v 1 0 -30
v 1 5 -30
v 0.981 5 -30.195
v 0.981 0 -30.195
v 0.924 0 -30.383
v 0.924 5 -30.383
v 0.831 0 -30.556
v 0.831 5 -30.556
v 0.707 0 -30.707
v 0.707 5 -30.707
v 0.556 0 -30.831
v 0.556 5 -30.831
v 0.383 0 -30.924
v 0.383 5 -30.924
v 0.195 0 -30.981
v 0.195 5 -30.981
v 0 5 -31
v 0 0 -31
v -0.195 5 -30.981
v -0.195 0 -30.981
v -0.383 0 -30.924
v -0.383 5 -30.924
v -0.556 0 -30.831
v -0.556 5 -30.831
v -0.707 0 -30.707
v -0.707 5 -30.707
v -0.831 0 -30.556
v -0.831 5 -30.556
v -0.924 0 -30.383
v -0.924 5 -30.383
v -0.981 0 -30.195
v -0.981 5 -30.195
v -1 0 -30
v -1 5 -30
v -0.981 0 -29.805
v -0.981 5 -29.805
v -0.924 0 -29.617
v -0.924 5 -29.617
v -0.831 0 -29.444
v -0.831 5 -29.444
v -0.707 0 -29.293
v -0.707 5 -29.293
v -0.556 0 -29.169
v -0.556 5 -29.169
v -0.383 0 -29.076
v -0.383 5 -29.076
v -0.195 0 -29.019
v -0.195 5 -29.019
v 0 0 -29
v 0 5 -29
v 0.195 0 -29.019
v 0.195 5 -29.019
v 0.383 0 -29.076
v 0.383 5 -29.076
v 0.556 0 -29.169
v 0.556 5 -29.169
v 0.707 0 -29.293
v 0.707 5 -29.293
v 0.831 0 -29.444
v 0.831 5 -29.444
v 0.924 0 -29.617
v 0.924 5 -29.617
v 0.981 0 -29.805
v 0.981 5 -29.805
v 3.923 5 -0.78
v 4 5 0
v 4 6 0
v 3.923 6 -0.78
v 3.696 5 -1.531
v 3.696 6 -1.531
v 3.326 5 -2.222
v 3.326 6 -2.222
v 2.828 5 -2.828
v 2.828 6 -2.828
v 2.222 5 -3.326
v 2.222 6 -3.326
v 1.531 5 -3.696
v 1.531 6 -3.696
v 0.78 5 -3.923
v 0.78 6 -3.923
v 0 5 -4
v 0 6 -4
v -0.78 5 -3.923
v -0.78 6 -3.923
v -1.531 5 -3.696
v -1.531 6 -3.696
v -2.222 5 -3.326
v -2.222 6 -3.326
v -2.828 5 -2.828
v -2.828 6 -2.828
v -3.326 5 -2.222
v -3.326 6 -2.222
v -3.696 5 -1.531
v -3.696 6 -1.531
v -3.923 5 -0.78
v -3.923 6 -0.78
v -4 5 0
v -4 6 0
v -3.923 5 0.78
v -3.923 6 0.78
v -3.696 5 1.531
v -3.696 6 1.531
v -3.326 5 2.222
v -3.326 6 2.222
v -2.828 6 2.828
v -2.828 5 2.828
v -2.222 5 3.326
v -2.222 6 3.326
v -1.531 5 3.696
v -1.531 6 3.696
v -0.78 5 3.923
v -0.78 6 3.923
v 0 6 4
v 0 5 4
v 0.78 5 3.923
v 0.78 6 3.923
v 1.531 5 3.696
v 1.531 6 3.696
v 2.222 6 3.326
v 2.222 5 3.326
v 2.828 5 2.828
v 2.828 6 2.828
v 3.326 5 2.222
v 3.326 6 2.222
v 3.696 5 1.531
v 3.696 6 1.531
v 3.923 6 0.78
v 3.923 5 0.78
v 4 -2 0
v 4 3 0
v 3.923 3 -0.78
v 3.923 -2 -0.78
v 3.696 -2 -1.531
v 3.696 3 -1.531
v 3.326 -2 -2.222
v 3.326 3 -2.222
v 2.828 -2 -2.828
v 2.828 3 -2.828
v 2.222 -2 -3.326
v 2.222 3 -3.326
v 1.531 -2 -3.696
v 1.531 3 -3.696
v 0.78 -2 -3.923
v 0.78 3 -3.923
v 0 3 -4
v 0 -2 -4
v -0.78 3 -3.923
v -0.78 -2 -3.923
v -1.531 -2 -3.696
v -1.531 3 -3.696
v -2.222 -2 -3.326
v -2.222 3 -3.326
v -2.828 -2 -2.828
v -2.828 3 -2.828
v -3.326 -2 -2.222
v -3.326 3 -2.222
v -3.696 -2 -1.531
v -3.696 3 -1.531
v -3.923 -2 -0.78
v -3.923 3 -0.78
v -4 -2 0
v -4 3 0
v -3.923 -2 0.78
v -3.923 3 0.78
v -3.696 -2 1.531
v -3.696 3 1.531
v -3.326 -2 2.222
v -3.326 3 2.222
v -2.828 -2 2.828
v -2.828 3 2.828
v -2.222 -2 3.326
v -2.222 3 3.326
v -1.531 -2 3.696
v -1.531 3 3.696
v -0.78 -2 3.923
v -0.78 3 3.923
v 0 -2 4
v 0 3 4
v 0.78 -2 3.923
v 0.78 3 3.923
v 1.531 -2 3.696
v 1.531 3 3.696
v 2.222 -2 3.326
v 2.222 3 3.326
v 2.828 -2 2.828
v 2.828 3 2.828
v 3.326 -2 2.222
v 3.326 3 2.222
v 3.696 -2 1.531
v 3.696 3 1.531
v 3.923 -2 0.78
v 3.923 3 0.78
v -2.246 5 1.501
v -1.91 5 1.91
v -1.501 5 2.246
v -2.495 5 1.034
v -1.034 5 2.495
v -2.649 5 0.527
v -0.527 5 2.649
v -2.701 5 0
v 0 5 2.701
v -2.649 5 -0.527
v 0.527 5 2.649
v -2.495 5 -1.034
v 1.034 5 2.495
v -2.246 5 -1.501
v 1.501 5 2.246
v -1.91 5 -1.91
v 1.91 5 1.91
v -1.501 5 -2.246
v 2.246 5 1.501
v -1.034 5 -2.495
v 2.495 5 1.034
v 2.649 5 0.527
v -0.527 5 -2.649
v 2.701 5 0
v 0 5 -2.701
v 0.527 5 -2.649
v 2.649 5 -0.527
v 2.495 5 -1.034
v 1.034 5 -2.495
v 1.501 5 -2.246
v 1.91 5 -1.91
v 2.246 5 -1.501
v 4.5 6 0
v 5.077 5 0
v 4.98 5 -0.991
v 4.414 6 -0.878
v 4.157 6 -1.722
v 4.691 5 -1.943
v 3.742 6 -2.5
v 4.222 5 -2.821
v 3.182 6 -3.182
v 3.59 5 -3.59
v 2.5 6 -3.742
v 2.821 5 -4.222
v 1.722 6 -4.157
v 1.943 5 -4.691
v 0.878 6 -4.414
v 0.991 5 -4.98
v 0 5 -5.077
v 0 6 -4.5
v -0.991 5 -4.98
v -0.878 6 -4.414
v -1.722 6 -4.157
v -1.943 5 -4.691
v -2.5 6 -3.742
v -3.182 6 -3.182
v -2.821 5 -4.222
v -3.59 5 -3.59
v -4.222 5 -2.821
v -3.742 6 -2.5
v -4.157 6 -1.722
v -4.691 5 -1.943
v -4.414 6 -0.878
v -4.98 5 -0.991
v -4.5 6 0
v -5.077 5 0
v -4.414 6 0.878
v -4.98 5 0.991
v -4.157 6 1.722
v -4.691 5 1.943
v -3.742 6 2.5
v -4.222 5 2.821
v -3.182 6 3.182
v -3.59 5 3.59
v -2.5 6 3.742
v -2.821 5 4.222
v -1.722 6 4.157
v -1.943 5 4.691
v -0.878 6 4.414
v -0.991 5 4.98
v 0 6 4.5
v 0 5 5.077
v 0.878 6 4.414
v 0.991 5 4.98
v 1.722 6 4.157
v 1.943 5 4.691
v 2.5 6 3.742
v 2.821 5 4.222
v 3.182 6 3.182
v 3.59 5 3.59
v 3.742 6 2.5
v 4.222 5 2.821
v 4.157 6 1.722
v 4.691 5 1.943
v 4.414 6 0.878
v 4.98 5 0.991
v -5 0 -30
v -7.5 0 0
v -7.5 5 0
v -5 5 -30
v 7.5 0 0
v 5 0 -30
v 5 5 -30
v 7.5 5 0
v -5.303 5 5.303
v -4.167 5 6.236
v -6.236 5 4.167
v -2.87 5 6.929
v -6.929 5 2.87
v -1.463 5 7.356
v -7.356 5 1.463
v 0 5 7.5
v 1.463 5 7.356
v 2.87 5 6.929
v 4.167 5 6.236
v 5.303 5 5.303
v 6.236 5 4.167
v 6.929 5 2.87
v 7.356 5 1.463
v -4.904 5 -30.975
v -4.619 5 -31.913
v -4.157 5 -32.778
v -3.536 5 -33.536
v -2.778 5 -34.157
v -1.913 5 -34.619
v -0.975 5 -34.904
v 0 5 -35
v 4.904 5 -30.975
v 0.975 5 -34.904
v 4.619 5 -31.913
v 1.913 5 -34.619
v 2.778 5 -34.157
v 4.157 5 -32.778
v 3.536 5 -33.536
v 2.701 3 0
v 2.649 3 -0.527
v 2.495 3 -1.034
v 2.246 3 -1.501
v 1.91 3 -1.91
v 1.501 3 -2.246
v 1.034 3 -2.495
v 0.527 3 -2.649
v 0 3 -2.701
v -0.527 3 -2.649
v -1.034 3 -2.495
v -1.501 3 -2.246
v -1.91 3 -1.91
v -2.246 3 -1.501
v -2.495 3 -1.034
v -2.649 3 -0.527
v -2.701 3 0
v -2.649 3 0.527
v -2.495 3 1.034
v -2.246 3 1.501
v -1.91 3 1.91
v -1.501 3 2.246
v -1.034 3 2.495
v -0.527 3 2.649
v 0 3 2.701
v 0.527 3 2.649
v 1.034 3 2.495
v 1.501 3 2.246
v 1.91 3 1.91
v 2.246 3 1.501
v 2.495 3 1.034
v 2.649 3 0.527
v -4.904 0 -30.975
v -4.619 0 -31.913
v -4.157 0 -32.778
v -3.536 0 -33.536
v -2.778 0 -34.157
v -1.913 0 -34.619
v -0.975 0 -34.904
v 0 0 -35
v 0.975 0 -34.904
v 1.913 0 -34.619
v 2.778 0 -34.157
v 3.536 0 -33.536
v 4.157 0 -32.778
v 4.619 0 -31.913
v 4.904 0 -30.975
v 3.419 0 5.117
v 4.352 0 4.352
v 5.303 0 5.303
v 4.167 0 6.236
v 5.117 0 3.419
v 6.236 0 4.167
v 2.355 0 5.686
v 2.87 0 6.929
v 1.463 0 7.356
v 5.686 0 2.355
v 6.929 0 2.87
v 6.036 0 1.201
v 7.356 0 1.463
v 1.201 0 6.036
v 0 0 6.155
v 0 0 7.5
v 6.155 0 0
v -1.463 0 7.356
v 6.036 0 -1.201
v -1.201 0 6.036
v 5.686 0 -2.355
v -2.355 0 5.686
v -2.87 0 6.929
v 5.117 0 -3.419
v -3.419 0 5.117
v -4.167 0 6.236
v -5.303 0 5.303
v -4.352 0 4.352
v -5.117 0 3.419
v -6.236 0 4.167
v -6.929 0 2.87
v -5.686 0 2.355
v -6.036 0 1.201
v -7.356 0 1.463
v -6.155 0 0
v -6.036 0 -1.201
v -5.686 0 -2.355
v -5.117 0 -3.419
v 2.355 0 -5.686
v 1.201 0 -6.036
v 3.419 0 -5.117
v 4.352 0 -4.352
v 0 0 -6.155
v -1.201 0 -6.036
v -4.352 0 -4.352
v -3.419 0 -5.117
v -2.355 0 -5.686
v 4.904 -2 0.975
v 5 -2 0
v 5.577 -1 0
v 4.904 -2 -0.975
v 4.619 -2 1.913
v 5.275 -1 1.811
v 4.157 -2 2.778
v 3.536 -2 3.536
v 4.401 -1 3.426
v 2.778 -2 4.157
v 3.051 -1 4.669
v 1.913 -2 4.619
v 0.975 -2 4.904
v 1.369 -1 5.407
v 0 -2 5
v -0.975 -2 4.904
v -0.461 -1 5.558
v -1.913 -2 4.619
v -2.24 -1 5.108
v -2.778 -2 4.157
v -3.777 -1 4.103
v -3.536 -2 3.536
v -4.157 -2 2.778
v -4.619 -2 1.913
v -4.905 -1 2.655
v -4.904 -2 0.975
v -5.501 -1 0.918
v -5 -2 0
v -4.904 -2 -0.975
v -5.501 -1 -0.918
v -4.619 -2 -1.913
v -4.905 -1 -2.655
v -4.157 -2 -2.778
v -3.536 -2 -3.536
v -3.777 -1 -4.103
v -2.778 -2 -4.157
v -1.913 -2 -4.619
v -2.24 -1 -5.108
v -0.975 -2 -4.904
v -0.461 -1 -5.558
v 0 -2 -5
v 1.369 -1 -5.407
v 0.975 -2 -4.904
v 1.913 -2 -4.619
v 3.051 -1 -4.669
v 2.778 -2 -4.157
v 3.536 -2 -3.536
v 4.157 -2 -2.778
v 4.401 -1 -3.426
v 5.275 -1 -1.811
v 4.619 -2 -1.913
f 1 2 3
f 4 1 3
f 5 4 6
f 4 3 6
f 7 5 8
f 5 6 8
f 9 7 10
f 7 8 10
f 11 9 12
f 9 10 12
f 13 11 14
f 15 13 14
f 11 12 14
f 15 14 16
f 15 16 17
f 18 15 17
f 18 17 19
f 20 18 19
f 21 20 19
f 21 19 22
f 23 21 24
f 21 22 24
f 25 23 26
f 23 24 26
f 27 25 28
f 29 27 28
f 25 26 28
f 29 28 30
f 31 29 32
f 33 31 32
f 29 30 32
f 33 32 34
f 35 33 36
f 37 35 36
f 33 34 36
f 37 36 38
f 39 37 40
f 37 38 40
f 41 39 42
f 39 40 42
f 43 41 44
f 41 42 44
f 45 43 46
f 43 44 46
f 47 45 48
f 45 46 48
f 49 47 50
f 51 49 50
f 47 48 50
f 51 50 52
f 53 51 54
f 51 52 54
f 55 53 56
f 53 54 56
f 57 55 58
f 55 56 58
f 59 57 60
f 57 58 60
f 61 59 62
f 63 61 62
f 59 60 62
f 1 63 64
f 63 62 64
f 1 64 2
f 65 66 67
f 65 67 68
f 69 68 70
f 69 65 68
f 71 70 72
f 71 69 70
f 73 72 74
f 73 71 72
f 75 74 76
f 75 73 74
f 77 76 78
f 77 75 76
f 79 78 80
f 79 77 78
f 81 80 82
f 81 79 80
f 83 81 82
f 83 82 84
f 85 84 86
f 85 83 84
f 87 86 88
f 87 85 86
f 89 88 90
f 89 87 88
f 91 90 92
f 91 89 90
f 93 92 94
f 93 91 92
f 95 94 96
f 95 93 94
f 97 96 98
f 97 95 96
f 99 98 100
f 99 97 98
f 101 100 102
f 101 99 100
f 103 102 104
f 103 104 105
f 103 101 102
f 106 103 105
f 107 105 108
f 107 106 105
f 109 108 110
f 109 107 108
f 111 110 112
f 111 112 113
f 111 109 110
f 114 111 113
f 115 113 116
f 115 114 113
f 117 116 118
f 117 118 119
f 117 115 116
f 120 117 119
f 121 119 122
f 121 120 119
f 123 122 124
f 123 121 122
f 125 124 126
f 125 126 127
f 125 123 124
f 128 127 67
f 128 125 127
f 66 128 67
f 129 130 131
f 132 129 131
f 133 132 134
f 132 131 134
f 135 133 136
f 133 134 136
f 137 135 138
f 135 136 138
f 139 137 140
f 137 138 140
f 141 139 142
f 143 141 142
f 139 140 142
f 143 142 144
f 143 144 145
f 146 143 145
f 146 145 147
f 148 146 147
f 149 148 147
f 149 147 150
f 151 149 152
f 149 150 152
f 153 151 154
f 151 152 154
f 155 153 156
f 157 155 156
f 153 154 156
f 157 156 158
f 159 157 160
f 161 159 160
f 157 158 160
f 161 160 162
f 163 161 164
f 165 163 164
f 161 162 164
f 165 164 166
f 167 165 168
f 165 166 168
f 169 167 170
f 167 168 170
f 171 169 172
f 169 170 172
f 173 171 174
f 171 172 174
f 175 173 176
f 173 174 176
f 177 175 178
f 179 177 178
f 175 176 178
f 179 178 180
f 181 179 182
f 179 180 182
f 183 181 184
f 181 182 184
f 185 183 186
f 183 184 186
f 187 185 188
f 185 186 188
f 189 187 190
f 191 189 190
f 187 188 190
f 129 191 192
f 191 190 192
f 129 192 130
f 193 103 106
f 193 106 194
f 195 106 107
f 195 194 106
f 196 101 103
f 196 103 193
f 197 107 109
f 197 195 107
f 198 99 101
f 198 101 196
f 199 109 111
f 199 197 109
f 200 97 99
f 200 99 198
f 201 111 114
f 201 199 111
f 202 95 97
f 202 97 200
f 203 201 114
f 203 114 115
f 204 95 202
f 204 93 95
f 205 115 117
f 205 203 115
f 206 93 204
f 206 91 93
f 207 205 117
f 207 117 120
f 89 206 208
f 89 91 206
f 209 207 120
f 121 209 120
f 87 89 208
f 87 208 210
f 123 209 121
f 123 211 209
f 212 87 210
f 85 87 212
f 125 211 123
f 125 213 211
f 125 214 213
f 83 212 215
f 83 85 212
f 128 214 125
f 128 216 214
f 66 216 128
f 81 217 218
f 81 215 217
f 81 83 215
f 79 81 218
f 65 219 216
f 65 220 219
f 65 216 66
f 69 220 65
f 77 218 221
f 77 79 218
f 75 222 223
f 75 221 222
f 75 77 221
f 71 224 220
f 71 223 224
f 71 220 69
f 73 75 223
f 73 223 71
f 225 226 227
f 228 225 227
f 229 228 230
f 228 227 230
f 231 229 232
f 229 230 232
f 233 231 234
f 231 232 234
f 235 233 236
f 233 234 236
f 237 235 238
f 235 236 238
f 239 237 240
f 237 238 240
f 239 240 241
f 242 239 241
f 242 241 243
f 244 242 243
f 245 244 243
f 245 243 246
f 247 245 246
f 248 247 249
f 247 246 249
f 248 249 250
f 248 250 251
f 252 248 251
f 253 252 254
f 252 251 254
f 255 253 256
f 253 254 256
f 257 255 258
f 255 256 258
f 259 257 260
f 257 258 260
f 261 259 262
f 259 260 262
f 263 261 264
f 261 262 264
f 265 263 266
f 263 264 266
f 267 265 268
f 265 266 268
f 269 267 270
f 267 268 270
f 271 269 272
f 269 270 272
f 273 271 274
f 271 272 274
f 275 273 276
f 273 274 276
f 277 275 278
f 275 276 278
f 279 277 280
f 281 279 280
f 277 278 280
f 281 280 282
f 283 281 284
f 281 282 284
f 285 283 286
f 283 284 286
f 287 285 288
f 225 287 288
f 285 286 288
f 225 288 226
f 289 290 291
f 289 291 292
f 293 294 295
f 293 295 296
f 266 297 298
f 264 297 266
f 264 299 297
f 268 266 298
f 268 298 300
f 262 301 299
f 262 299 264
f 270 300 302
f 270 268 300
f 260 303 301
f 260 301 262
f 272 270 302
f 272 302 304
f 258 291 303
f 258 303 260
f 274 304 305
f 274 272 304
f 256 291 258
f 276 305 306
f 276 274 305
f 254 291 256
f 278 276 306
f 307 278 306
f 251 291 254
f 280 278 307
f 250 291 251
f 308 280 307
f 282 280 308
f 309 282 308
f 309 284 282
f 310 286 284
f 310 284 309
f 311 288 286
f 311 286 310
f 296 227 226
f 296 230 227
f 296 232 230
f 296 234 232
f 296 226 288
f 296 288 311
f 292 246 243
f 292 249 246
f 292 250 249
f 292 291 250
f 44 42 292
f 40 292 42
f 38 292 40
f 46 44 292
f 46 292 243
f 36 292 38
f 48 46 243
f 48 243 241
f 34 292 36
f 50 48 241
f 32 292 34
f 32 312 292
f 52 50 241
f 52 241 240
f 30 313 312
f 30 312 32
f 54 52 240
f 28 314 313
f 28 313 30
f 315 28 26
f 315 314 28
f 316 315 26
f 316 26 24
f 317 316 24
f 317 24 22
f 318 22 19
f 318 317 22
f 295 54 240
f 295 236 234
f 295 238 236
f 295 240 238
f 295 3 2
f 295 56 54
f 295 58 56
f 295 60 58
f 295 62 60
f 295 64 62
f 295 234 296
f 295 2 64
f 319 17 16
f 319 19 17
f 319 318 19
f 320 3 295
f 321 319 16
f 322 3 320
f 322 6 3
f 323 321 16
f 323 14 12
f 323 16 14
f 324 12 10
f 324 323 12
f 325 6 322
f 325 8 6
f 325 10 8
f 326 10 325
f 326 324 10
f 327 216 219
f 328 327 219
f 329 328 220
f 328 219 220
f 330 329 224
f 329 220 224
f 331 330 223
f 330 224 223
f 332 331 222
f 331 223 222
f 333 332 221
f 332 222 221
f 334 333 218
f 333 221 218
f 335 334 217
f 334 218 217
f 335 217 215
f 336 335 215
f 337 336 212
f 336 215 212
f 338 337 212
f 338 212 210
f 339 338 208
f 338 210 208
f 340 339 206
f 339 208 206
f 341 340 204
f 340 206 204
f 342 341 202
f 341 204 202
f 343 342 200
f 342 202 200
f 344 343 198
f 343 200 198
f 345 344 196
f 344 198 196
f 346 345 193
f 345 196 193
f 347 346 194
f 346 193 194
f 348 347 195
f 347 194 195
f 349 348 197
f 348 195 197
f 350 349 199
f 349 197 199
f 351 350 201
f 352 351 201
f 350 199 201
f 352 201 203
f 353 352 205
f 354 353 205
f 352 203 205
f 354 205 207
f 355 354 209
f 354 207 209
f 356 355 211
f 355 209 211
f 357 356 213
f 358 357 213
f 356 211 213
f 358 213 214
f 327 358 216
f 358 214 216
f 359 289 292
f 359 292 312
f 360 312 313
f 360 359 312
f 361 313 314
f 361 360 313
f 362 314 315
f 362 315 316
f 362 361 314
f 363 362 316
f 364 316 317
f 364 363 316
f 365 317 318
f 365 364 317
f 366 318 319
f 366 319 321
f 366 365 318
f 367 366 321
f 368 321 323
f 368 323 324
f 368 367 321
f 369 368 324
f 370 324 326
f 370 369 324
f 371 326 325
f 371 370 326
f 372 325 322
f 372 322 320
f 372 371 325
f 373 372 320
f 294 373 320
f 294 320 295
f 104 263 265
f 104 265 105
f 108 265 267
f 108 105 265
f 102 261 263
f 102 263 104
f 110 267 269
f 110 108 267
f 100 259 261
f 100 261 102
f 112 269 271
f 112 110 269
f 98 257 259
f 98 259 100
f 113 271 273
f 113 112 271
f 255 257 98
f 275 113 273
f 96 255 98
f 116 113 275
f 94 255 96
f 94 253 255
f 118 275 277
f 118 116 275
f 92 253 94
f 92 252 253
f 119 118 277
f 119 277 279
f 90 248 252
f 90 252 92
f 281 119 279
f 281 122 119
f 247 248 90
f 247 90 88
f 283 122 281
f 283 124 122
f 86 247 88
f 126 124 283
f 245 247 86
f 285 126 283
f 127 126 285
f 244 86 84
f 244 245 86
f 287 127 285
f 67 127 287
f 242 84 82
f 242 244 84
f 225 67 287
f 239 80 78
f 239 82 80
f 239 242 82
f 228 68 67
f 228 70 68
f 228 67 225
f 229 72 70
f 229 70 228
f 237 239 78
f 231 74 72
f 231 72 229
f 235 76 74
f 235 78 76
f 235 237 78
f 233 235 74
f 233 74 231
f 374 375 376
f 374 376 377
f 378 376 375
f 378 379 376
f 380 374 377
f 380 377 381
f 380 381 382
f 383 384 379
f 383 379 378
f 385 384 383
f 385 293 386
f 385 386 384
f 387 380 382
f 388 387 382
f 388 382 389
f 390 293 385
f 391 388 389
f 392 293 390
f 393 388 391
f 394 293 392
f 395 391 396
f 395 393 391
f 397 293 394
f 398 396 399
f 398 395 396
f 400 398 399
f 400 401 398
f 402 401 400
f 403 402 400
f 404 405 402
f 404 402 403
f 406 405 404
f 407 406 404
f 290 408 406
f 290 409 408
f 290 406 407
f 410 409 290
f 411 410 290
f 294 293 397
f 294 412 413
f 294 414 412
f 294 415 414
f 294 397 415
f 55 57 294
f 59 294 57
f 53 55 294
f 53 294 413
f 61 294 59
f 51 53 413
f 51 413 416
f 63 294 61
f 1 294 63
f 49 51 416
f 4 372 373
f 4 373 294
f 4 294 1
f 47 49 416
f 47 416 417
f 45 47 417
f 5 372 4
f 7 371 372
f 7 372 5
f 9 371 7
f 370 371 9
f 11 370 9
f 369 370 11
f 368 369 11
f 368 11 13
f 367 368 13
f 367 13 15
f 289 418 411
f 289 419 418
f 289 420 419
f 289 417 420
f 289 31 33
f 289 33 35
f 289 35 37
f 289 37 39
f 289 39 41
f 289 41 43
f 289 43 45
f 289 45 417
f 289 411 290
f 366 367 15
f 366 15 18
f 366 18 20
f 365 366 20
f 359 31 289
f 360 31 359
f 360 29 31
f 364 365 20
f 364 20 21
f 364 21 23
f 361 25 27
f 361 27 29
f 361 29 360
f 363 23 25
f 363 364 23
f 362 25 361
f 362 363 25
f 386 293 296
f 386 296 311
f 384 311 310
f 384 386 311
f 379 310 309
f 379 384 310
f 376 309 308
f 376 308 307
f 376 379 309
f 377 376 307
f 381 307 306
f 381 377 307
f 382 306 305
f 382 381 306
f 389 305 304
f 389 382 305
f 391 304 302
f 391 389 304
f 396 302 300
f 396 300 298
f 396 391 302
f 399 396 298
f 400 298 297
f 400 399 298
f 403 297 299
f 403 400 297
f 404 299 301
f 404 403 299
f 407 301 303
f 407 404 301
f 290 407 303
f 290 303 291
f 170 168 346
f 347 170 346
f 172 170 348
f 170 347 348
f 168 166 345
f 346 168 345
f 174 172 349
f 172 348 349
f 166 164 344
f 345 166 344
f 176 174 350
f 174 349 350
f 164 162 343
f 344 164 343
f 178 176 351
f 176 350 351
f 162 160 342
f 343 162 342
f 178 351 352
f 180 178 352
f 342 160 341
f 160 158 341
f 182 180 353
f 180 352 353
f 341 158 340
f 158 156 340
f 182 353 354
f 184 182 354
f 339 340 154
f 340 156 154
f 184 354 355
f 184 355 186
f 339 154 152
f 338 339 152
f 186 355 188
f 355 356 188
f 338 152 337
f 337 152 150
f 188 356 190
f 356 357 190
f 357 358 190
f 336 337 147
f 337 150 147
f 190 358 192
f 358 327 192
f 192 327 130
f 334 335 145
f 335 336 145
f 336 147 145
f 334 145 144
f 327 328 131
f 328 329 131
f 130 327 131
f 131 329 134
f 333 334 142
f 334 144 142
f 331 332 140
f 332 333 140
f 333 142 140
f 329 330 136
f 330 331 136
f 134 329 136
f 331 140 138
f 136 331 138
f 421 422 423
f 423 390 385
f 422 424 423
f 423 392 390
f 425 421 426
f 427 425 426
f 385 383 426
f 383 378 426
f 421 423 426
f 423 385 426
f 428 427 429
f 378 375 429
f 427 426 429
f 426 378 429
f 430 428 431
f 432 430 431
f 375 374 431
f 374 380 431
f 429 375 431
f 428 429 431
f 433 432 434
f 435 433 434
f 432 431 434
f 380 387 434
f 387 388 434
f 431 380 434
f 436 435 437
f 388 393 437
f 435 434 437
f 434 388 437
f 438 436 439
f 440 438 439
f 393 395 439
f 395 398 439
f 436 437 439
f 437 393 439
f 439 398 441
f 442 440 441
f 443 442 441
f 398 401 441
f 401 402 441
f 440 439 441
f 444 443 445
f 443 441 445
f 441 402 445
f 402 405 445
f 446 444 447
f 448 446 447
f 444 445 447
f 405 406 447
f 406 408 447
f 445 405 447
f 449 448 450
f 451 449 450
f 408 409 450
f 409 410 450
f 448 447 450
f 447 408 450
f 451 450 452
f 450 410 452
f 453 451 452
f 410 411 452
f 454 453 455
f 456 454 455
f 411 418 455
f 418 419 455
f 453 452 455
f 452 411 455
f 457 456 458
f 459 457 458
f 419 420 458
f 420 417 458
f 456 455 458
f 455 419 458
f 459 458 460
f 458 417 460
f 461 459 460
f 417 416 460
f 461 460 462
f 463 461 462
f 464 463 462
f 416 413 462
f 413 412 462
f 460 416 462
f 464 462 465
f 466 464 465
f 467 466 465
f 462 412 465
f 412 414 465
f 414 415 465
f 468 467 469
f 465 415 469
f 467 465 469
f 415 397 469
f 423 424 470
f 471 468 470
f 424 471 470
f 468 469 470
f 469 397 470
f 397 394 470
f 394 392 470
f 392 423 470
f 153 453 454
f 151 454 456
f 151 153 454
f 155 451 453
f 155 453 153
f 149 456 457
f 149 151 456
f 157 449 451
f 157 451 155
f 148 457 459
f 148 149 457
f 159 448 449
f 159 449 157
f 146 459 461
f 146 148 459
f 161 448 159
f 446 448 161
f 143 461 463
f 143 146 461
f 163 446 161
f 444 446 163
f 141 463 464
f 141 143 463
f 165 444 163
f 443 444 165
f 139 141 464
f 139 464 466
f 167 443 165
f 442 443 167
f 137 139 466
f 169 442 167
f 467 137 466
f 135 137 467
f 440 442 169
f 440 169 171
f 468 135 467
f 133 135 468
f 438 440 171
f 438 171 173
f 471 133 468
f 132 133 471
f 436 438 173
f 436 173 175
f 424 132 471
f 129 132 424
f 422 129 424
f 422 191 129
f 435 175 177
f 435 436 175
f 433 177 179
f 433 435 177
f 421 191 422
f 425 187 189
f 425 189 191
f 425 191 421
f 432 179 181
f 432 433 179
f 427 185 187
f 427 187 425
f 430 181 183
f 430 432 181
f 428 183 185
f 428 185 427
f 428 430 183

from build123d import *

# Parameters (mm, degrees)
BOSS_EXTRUDE1_DEPTH = 5
SKETCH2_R           = 4
SKETCH2_R_2         = 1
CUT_EXTRUDE1_DEPTH  = 5
SKETCH3_R           = 5
BOSS_EXTRUDE3_DEPTH = 2
DRAFT3_ANGLE        = 30
SKETCH4_R           = 4
CUT_EXTRUDE2_DEPTH  = 2
SKETCH5_R           = 4
SKETCH5_R_2         = 2.700917016
BOSS_EXTRUDE4_DEPTH = 2
SKETCH6_R           = 4.5
SKETCH6_R_2         = 4
BOSS_EXTRUDE5_DEPTH = 1
DRAFT4_ANGLE        = 30


with BuildPart() as part:
    # Sketch1 → Boss-Extrude1 (new body)
    with BuildSketch(Plane(origin=(0, 0, 0), x_dir=(1, 0, 0), z_dir=(0, 1, 0))):
        with BuildLine():
            Line((-7.5, 0), (-5, 30))
            ThreePointArc((-5, 30), (0, 35), (5, 30))
            Line((5, 30), (7.5, 0))
            ThreePointArc((7.5, 0), (0, -7.5), (-7.5, 0))
        make_face()
    extrude(amount=BOSS_EXTRUDE1_DEPTH)

    # Sketch2 → Cut-Extrude1 (cut)
    with BuildSketch(Plane(origin=(0, 5, 0), x_dir=(1, 0, 0), z_dir=(0, 1, 0))):
        Circle(SKETCH2_R)
        with Locations((0, 30)):
            Circle(SKETCH2_R_2)
    extrude(amount=-CUT_EXTRUDE1_DEPTH, mode=Mode.SUBTRACT)

    # Sketch3 → Boss-Extrude3 (add)
    with BuildSketch(Plane.XZ):
        Circle(SKETCH3_R)
    extrude(amount=BOSS_EXTRUDE3_DEPTH)

    # Draft3
    draft3_faces = [part.faces().sort_by_distance(p)[0] for p in [
        (-5, -1, 0),
    ]]
    draft(draft3_faces, Plane(origin=(0, -2, 0), x_dir=(0, 0, -1), z_dir=(0, -1, 0)), DRAFT3_ANGLE)

    # Sketch4 → Cut-Extrude2 (cut)
    with BuildSketch(Plane(origin=(0, 0, 0), x_dir=(1, 0, 0), z_dir=(0, 1, 0))):
        Circle(SKETCH4_R)
    extrude(amount=-CUT_EXTRUDE2_DEPTH, mode=Mode.SUBTRACT)

    # Sketch5 → Boss-Extrude4 (add)
    with BuildSketch(Plane(origin=(0, 5, 0), x_dir=(1, 0, 0), z_dir=(0, 1, 0))):
        Circle(SKETCH5_R)
        Circle(SKETCH5_R_2, mode=Mode.SUBTRACT)
    extrude(amount=-BOSS_EXTRUDE4_DEPTH)

    # Sketch6 → Boss-Extrude5 (add)
    with BuildSketch(Plane(origin=(0, 5, 0), x_dir=(1, 0, 0), z_dir=(0, 1, 0))):
        Circle(SKETCH6_R)
        Circle(SKETCH6_R_2, mode=Mode.SUBTRACT)
    extrude(amount=BOSS_EXTRUDE5_DEPTH)

    # Draft4
    draft4_faces = [part.faces().sort_by_distance(p)[0] for p in [
        (-4.5, 5.5, 0),
    ]]
    draft(draft4_faces, Plane.ZX.offset(6), DRAFT4_ANGLE)


solid = part.part
